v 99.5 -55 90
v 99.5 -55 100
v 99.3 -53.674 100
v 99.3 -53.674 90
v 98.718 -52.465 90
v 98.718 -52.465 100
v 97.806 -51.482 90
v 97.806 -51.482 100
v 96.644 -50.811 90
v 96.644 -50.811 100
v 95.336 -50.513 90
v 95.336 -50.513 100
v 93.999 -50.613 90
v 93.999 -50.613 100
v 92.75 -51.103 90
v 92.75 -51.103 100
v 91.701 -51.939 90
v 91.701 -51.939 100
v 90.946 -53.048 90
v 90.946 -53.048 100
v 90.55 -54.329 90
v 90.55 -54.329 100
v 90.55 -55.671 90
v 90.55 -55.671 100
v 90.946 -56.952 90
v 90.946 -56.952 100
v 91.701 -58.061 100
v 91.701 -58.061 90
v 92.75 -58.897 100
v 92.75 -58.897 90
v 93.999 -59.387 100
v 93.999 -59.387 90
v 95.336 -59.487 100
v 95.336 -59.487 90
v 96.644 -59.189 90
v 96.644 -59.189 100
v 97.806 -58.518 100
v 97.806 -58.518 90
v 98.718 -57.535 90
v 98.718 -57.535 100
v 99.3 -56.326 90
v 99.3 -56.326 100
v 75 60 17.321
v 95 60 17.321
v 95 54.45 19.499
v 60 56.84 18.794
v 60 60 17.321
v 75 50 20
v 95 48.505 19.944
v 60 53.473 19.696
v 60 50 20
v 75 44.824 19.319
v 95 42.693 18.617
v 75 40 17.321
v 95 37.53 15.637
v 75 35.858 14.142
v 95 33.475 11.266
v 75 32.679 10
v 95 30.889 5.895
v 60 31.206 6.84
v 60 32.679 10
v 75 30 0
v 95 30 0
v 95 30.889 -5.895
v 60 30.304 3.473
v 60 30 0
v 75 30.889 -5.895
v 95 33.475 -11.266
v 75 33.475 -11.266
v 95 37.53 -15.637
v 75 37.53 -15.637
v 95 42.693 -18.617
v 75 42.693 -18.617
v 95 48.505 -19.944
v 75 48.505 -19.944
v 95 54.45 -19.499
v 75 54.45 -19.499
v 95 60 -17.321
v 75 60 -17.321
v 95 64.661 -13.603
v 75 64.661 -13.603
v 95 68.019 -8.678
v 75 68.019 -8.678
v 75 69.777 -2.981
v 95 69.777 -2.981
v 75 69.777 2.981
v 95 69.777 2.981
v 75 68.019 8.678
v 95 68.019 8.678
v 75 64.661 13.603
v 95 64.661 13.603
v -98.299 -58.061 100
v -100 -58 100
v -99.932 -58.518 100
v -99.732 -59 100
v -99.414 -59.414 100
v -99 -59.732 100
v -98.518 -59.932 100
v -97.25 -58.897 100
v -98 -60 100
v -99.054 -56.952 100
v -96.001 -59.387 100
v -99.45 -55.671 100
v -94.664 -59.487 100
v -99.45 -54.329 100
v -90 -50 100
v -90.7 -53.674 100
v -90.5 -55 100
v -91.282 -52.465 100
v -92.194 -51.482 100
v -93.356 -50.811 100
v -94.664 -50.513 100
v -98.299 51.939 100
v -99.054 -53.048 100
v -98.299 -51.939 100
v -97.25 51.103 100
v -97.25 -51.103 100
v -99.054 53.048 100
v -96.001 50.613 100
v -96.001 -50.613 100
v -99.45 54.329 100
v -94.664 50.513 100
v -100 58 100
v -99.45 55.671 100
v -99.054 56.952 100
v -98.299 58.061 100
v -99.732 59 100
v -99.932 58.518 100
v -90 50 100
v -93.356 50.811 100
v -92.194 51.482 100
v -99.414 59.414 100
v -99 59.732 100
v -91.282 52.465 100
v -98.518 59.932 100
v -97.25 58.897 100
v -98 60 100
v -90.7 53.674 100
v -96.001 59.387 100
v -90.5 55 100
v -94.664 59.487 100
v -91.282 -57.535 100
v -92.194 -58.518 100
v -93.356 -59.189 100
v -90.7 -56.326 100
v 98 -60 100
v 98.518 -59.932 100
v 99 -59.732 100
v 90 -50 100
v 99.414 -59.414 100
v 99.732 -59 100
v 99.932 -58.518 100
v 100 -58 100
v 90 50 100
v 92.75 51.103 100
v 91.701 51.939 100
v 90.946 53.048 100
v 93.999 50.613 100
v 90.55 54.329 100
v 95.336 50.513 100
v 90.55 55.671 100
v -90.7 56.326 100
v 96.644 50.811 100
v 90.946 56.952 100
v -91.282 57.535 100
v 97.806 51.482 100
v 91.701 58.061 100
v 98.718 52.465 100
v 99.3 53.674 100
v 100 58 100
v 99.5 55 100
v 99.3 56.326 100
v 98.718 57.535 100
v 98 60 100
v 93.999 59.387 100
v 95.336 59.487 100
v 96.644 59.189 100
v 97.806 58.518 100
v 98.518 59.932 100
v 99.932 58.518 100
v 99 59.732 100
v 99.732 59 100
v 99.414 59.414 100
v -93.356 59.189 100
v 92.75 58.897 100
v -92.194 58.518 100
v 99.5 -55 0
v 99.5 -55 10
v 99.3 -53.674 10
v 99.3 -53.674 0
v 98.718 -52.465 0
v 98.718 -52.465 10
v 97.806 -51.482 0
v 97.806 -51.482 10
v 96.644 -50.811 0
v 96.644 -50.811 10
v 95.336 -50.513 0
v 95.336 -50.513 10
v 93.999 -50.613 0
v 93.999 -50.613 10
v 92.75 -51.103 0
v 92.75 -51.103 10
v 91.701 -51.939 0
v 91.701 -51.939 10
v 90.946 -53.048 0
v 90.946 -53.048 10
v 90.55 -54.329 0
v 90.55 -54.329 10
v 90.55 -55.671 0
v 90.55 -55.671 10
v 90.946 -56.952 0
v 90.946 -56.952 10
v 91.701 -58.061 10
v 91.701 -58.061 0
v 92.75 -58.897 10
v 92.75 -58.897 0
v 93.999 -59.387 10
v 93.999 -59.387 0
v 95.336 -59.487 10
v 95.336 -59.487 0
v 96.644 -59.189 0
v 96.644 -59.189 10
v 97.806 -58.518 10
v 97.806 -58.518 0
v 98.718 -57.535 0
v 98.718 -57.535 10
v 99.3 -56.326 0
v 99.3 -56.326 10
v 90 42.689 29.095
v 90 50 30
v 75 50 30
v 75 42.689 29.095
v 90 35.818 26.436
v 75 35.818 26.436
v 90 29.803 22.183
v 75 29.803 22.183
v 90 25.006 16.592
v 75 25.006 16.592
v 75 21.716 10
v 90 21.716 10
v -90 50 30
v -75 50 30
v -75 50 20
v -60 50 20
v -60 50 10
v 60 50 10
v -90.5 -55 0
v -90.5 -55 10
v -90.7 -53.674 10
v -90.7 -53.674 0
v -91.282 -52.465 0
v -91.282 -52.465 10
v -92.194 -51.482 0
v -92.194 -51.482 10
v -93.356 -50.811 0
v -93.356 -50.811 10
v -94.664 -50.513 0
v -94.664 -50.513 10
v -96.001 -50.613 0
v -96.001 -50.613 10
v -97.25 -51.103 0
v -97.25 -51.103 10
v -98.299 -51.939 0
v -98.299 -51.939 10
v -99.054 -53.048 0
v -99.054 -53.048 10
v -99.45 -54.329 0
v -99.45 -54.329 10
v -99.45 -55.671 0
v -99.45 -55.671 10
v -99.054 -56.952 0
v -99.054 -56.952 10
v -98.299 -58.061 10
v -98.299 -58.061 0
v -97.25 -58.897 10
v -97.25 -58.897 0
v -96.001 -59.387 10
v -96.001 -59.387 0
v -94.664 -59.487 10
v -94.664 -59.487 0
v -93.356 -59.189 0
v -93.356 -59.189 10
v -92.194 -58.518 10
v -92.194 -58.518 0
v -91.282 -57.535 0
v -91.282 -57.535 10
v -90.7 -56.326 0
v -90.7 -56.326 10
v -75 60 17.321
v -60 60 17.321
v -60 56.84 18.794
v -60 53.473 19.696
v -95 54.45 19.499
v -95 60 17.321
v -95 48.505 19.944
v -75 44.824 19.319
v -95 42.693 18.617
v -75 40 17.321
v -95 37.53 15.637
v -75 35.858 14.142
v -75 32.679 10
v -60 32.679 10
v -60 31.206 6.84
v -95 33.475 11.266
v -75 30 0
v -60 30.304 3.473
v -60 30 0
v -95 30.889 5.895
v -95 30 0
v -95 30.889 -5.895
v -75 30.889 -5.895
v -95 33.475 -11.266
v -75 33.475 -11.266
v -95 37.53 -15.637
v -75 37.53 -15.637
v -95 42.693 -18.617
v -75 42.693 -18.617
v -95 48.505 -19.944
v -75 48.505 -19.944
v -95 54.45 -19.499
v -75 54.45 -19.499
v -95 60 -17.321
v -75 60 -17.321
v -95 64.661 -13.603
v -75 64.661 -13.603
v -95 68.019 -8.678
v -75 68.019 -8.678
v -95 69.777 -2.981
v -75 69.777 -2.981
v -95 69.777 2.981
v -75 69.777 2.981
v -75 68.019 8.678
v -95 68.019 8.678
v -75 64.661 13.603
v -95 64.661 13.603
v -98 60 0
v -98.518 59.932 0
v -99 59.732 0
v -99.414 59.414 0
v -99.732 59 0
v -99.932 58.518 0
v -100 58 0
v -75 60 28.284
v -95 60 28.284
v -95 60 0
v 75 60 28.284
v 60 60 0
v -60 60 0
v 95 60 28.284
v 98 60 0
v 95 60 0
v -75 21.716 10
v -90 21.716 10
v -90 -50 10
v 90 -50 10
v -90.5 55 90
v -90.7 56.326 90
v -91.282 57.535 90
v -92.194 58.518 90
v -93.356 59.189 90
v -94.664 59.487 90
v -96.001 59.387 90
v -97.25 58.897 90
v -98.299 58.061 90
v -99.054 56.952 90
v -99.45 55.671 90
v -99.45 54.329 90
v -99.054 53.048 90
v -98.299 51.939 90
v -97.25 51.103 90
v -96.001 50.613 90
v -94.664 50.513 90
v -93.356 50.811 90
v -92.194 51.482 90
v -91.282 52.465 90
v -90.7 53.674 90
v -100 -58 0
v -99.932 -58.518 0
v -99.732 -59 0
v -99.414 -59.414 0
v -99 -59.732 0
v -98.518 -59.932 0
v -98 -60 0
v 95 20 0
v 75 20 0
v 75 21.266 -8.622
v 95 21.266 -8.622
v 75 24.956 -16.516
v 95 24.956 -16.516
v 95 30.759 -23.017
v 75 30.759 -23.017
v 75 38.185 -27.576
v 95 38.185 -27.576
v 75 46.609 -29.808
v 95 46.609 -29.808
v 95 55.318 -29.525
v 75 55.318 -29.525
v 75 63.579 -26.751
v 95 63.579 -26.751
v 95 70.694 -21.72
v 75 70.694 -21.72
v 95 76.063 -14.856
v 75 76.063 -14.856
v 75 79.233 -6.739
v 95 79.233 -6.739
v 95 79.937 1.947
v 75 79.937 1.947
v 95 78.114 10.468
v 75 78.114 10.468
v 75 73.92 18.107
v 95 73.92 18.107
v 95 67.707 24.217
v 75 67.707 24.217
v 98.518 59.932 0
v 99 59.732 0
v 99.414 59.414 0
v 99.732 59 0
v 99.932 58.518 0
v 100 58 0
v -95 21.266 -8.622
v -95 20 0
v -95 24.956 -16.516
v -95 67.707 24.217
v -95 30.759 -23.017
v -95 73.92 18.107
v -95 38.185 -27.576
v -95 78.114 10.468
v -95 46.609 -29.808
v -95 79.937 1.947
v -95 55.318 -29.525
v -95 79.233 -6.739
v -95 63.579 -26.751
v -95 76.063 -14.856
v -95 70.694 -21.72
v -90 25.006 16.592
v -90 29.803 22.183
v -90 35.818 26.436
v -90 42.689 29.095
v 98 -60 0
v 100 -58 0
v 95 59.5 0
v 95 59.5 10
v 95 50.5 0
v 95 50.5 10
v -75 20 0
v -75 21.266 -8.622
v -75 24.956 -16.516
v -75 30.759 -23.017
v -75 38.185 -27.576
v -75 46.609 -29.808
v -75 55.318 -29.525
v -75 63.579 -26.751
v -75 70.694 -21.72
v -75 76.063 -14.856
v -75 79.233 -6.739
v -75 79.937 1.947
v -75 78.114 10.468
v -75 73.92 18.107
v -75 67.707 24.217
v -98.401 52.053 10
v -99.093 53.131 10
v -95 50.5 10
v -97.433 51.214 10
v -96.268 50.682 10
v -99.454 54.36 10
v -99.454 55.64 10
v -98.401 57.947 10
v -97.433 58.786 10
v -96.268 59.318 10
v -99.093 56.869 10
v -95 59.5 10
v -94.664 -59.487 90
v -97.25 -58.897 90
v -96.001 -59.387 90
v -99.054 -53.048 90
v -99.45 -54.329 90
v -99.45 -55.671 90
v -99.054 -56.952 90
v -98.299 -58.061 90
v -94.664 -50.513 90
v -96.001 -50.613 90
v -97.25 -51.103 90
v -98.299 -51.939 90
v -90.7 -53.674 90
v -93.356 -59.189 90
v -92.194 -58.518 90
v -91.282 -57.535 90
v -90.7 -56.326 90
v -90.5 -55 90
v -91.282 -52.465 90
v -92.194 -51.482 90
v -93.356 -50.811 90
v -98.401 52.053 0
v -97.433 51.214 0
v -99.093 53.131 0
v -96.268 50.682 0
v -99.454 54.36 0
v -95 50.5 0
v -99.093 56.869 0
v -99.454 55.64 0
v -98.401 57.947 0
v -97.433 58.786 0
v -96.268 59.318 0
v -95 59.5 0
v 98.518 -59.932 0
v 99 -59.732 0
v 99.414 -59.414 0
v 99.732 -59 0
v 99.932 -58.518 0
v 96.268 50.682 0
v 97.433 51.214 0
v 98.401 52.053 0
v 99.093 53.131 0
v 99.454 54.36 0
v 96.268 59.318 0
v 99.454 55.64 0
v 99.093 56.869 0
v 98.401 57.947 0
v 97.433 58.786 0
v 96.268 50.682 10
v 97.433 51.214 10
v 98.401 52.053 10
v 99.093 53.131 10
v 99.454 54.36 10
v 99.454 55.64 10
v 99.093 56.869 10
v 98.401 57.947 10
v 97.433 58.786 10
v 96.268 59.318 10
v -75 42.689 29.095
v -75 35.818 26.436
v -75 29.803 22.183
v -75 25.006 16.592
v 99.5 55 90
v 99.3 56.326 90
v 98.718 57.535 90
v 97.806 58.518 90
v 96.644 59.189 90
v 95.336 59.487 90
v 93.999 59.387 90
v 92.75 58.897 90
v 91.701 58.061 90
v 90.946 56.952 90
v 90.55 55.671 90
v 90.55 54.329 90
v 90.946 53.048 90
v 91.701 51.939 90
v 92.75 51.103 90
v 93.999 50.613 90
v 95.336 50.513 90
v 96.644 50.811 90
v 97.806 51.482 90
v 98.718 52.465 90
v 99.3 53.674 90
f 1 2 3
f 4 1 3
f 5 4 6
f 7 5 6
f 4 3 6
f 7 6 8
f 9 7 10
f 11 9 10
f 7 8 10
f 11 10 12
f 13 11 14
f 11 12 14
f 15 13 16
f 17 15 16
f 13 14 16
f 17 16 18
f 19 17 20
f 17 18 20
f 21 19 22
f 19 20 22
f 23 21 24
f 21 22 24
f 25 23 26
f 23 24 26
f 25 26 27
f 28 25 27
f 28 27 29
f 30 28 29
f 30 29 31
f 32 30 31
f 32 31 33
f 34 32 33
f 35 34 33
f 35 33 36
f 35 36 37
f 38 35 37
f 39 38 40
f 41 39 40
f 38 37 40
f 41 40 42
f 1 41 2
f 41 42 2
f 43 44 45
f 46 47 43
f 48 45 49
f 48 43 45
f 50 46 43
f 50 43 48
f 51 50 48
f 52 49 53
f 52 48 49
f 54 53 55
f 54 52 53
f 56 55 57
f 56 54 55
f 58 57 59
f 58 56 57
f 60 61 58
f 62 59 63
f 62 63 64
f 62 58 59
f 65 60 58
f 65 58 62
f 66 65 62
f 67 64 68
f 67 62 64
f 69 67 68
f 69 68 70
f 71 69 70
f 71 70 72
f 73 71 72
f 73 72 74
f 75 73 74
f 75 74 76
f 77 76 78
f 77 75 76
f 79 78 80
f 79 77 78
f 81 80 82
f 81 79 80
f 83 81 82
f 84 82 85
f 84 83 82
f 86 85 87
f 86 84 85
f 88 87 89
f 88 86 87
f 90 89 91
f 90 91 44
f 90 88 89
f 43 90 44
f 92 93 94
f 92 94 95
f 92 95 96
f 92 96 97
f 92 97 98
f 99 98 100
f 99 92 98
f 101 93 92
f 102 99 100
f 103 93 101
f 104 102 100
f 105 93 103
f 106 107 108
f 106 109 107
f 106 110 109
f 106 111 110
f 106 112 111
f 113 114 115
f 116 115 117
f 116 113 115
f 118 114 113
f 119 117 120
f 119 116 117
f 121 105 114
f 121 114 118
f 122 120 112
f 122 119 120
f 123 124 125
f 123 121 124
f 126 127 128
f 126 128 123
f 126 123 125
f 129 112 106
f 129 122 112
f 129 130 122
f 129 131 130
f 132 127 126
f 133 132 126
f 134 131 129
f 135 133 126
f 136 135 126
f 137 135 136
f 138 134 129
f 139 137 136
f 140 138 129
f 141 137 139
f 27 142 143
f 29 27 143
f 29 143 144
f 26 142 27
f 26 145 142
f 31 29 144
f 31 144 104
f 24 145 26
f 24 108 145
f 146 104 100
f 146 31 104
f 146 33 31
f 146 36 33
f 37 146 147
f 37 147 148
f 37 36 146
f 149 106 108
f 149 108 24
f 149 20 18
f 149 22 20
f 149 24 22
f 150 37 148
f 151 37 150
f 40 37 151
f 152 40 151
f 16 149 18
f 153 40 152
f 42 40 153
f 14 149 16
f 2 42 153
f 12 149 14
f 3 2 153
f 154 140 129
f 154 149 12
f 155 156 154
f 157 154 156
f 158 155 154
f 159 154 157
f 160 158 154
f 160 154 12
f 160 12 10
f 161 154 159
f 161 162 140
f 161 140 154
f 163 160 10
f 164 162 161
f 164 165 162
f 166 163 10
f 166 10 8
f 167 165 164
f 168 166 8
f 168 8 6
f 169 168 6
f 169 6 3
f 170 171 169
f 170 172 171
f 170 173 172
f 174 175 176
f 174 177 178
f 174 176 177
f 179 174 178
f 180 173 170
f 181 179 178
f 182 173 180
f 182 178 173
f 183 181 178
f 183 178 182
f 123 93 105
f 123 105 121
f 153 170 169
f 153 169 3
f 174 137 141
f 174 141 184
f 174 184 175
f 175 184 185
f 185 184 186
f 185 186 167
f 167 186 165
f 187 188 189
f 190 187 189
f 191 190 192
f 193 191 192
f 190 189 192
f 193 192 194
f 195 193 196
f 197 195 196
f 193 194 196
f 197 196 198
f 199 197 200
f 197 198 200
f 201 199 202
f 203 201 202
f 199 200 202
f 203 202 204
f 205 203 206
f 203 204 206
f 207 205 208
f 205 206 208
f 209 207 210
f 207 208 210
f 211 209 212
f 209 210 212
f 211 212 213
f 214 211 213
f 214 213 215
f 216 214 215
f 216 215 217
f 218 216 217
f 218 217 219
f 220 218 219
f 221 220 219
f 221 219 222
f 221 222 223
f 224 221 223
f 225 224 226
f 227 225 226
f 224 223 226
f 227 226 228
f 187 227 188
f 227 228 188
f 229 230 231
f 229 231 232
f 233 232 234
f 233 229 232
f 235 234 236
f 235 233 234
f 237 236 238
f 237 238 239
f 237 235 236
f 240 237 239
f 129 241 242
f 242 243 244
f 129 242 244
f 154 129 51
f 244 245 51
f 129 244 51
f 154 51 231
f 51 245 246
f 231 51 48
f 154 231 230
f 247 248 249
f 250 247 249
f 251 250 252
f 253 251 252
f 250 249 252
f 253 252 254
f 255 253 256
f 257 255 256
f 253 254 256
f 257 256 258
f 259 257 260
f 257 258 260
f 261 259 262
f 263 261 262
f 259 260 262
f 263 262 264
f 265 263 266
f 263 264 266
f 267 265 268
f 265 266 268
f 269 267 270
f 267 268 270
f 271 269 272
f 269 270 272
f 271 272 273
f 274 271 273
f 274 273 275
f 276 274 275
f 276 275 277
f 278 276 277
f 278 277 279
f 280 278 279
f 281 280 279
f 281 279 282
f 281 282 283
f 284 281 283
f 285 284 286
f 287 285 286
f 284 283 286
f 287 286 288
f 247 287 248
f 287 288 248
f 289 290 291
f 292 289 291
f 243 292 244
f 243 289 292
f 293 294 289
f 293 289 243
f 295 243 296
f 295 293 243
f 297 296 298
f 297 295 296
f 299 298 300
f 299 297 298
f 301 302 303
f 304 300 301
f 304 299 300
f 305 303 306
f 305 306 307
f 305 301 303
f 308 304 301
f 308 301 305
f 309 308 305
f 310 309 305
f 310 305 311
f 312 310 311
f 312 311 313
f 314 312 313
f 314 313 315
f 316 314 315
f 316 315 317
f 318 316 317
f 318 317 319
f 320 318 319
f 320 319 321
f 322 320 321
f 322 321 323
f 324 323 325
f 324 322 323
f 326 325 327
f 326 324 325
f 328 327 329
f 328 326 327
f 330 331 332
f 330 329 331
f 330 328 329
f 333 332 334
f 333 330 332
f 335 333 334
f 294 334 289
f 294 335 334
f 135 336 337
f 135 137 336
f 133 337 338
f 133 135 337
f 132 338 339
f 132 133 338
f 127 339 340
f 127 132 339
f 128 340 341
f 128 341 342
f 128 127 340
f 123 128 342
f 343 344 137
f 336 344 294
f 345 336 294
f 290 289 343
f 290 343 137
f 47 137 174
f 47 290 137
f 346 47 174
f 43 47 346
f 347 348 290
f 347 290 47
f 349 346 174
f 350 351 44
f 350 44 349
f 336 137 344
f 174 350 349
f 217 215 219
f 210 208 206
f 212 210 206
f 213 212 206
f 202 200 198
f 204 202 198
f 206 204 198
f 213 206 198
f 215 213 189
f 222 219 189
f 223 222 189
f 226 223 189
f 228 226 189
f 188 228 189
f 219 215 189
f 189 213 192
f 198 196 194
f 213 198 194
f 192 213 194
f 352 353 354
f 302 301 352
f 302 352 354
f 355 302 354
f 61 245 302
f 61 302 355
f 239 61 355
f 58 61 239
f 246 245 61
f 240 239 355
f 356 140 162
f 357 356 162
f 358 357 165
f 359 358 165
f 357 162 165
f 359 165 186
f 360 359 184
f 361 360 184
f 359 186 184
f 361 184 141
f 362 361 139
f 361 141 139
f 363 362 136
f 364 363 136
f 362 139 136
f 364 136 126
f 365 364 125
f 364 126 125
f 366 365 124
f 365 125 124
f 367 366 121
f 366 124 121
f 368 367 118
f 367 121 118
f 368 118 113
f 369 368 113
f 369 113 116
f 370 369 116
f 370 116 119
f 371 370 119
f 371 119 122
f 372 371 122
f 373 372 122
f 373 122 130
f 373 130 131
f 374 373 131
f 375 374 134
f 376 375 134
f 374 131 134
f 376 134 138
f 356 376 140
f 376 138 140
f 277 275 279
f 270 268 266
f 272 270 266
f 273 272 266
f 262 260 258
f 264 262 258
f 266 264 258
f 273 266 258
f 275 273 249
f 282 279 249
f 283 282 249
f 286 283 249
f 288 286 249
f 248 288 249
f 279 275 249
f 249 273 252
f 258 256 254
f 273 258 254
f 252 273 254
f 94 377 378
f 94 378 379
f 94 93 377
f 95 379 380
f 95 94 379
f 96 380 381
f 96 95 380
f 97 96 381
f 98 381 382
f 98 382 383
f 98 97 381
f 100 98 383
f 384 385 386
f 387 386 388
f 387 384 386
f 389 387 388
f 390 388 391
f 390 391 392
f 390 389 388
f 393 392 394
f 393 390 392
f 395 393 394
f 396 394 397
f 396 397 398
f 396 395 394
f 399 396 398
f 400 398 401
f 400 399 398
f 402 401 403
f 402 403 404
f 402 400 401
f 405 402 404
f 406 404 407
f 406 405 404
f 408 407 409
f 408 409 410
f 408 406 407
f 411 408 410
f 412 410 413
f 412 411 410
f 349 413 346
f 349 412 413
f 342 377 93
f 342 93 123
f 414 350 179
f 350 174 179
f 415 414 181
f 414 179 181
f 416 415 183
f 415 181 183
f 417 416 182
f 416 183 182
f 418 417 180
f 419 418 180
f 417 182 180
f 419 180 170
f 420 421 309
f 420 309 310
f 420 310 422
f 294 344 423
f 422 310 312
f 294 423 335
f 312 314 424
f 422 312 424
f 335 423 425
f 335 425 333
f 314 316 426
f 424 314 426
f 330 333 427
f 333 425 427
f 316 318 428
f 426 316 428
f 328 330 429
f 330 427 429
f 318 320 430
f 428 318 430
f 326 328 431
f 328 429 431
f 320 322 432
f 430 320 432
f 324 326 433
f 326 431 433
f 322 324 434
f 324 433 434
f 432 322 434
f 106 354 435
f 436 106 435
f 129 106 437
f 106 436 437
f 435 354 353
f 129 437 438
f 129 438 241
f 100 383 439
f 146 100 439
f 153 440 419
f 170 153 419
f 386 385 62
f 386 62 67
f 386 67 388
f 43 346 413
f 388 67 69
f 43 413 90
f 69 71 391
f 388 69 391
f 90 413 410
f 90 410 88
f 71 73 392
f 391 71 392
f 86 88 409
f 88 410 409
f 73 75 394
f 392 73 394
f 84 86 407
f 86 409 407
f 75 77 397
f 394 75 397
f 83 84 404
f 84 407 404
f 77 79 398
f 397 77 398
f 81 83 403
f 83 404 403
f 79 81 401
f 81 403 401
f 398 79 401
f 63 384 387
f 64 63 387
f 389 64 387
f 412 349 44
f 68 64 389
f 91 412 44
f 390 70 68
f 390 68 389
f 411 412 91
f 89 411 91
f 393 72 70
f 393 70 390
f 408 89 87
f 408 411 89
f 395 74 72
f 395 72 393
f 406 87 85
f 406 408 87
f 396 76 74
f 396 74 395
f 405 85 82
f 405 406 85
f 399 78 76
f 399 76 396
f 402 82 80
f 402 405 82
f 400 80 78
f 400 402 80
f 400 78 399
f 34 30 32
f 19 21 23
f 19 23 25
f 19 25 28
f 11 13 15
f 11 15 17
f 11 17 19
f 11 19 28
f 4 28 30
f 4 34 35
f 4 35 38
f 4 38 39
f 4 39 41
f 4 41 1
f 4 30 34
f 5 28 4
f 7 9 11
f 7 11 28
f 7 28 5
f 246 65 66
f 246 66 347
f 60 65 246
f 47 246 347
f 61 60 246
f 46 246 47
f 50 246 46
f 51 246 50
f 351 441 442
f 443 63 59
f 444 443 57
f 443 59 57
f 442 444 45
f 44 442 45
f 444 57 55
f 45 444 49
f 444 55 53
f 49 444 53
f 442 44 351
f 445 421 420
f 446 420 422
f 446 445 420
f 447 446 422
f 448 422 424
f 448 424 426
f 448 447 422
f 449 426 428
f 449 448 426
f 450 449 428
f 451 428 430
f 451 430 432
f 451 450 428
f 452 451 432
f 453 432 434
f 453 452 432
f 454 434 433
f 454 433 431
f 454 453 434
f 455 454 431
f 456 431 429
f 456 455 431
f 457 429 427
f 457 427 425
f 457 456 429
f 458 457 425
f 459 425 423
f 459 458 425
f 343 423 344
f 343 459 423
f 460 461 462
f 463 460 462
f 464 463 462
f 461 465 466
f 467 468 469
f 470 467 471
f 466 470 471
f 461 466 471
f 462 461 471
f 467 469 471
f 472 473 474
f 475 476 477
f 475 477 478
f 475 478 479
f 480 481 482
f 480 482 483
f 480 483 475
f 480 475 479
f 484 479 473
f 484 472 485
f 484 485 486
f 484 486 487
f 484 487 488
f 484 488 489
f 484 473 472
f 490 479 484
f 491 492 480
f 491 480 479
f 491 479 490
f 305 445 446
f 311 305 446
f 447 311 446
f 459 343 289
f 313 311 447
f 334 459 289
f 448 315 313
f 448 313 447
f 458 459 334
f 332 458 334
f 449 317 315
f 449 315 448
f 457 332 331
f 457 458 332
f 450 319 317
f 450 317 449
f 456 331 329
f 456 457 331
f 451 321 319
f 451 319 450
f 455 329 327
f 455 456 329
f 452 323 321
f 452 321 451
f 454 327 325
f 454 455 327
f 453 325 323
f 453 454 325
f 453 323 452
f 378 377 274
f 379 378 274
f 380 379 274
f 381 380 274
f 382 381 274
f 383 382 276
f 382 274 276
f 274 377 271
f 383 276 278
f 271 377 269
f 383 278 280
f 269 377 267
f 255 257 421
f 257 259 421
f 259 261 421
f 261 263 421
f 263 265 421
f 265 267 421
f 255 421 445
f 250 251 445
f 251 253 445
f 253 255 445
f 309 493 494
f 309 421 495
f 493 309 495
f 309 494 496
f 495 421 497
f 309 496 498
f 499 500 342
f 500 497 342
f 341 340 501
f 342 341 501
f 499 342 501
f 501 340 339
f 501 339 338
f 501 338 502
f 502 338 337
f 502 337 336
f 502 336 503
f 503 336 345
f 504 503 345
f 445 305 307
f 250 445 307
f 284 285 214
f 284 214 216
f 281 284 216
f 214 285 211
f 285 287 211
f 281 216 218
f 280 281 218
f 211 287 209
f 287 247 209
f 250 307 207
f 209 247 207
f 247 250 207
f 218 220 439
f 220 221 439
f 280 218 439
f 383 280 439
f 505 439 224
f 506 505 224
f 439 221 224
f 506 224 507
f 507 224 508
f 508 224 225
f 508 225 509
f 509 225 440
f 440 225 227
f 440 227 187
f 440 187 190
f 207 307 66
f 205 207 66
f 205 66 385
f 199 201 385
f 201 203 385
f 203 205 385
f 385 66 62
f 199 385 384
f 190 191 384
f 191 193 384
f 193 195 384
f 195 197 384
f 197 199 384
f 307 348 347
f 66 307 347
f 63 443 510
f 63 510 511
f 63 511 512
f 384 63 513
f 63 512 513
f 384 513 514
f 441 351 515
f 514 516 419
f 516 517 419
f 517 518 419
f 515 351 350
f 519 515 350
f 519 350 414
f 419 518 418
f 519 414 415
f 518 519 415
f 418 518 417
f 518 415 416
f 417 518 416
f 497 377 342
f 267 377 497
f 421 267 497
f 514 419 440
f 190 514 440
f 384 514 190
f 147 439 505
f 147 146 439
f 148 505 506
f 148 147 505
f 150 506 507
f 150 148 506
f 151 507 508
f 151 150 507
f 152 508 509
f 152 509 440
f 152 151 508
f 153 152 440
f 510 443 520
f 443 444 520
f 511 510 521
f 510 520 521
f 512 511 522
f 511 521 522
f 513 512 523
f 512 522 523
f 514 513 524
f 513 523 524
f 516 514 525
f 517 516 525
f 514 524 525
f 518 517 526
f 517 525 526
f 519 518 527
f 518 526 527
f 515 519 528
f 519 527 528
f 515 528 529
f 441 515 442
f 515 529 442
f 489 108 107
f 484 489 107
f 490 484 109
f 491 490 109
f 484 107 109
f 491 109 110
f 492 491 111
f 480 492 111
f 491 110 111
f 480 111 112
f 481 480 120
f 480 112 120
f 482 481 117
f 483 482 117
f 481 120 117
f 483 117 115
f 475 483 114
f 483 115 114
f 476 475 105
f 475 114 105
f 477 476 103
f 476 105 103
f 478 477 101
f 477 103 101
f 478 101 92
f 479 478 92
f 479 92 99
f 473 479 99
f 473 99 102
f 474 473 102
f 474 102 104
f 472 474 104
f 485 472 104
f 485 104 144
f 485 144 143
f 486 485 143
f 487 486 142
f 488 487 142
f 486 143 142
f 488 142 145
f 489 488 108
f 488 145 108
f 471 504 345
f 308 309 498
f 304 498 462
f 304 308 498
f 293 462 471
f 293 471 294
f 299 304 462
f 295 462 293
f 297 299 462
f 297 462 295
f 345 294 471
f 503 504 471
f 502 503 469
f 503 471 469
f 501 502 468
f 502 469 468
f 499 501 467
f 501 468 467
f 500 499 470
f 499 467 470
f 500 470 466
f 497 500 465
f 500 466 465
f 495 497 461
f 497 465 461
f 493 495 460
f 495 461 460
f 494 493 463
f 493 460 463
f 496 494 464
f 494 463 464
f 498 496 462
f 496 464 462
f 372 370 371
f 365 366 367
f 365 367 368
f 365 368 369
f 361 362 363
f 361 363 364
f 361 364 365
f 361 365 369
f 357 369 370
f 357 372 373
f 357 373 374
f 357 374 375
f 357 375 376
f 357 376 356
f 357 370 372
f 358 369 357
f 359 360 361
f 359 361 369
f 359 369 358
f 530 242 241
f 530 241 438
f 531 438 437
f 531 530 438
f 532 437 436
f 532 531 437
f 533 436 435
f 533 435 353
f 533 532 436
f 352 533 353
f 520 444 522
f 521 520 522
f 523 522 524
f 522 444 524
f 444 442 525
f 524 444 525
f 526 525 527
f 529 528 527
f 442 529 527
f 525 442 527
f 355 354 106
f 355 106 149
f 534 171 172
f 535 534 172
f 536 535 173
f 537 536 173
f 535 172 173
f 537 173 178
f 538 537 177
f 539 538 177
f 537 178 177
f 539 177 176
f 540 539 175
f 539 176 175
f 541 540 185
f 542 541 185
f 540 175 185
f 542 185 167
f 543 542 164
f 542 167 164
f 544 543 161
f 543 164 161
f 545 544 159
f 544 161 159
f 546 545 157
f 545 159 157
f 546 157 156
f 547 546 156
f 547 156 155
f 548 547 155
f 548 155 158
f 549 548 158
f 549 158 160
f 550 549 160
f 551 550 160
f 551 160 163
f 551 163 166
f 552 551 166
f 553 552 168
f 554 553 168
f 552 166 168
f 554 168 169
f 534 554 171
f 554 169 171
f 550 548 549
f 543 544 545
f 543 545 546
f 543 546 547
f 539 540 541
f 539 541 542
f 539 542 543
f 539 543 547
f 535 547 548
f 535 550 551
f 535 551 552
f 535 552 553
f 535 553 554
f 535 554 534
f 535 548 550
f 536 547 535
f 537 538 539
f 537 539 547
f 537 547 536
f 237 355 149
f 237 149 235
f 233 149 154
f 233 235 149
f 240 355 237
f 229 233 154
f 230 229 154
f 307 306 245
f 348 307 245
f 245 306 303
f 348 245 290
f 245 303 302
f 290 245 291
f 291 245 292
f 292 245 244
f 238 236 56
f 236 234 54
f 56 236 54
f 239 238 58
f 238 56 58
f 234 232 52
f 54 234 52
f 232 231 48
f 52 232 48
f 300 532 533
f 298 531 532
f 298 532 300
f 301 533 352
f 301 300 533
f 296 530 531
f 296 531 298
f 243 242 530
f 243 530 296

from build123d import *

# Parameters (mm, degrees)
SKETCH1_W           = 200
SKETCH1_H           = 120
BOSS_EXTRUDE1_DEPTH = 100
SHELL1_T            = -10
SKETCH2_R           = 30
BOSS_EXTRUDE2_DEPTH = 20
BOSS_EXTRUDE3_START = 20
SKETCH3_R           = 30
BOSS_EXTRUDE3_DEPTH = 20
SKETCH4_R           = 20
CUT_EXTRUDE1_DEPTH  = 35
CUT_EXTRUDE2_START  = -35
SKETCH5_R           = 20
CUT_EXTRUDE2_DEPTH  = 35
SKETCH7_R           = 4.5
CUT_EXTRUDE3_DEPTH  = 10
CUT_EXTRUDE4_START  = 10
SKETCH8_R           = 4.5
CUT_EXTRUDE4_DEPTH  = 10
FILLET1_R           = 2


with BuildPart() as part:
    # Sketch1 → Boss-Extrude1 (new body)
    with BuildSketch(Plane.XY):
        Rectangle(SKETCH1_W, SKETCH1_H)
    extrude(amount=BOSS_EXTRUDE1_DEPTH)

    # Shell1
    shell1_openings = [part.faces().sort_by_distance(p)[0] for p in [
        (0, 0, 100),
    ]]
    offset(amount=SHELL1_T, openings=shell1_openings, kind=Kind.INTERSECTION)

    # Sketch2 → Boss-Extrude2 (add)
    with BuildSketch(Plane(origin=(-75, 0, 0), x_dir=(0, 0, -1), z_dir=(1, 0, 0))):
        with Locations((0, 50)):
            Circle(SKETCH2_R)
    extrude(amount=-BOSS_EXTRUDE2_DEPTH)

    # Sketch3 → Boss-Extrude3 (add)
    with BuildSketch(Plane(origin=(75, 0, 0), x_dir=(0, 0, -1), z_dir=(1, 0, 0)).offset(BOSS_EXTRUDE3_START)):
        with Locations((0, 50)):
            Circle(SKETCH3_R)
    extrude(amount=-BOSS_EXTRUDE3_DEPTH)

    # Sketch4 → Cut-Extrude1 (cut)
    with BuildSketch(Plane(origin=(-95, 0, 0), x_dir=(0, 0, -1), z_dir=(1, 0, 0))):
        with Locations((0, 50)):
            Circle(SKETCH4_R)
    extrude(amount=CUT_EXTRUDE1_DEPTH, mode=Mode.SUBTRACT)

    # Sketch5 → Cut-Extrude2 (cut)
    with BuildSketch(Plane(origin=(95, 0, 0), x_dir=(0, 0, -1), z_dir=(1, 0, 0)).offset(CUT_EXTRUDE2_START)):
        with Locations((0, 50)):
            Circle(SKETCH5_R)
    extrude(amount=CUT_EXTRUDE2_DEPTH, mode=Mode.SUBTRACT)

    # Sketch7 → Cut-Extrude3 (cut)
    with BuildSketch(Plane.XY.offset(100)):
        with Locations((95, 55)):
            Circle(SKETCH7_R)
        with Locations((95, -55)):
            Circle(SKETCH7_R)
        with Locations((-95, 55)):
            Circle(SKETCH7_R)
        with Locations((-95, -55)):
            Circle(SKETCH7_R)
    extrude(amount=-CUT_EXTRUDE3_DEPTH, mode=Mode.SUBTRACT)

    # Sketch8 → Cut-Extrude4 (cut)
    with BuildSketch(Plane.XY.offset(CUT_EXTRUDE4_START)):
        with Locations((95, 55)):
            Circle(SKETCH8_R)
        with Locations((95, -55)):
            Circle(SKETCH8_R)
        with Locations((-95, 55)):
            Circle(SKETCH8_R)
        with Locations((-95, -55)):
            Circle(SKETCH8_R)
    extrude(amount=-CUT_EXTRUDE4_DEPTH, mode=Mode.SUBTRACT)

    # Fillet1
    fillet1_edges = [part.edges().sort_by_distance(p)[0] for p in [
        (-100, -60, 50),
        (-100, 60, 50),
        (100, -60, 50),
        (100, 60, 50),
    ]]
    fillet(fillet1_edges, radius=FILLET1_R)


solid = part.part
